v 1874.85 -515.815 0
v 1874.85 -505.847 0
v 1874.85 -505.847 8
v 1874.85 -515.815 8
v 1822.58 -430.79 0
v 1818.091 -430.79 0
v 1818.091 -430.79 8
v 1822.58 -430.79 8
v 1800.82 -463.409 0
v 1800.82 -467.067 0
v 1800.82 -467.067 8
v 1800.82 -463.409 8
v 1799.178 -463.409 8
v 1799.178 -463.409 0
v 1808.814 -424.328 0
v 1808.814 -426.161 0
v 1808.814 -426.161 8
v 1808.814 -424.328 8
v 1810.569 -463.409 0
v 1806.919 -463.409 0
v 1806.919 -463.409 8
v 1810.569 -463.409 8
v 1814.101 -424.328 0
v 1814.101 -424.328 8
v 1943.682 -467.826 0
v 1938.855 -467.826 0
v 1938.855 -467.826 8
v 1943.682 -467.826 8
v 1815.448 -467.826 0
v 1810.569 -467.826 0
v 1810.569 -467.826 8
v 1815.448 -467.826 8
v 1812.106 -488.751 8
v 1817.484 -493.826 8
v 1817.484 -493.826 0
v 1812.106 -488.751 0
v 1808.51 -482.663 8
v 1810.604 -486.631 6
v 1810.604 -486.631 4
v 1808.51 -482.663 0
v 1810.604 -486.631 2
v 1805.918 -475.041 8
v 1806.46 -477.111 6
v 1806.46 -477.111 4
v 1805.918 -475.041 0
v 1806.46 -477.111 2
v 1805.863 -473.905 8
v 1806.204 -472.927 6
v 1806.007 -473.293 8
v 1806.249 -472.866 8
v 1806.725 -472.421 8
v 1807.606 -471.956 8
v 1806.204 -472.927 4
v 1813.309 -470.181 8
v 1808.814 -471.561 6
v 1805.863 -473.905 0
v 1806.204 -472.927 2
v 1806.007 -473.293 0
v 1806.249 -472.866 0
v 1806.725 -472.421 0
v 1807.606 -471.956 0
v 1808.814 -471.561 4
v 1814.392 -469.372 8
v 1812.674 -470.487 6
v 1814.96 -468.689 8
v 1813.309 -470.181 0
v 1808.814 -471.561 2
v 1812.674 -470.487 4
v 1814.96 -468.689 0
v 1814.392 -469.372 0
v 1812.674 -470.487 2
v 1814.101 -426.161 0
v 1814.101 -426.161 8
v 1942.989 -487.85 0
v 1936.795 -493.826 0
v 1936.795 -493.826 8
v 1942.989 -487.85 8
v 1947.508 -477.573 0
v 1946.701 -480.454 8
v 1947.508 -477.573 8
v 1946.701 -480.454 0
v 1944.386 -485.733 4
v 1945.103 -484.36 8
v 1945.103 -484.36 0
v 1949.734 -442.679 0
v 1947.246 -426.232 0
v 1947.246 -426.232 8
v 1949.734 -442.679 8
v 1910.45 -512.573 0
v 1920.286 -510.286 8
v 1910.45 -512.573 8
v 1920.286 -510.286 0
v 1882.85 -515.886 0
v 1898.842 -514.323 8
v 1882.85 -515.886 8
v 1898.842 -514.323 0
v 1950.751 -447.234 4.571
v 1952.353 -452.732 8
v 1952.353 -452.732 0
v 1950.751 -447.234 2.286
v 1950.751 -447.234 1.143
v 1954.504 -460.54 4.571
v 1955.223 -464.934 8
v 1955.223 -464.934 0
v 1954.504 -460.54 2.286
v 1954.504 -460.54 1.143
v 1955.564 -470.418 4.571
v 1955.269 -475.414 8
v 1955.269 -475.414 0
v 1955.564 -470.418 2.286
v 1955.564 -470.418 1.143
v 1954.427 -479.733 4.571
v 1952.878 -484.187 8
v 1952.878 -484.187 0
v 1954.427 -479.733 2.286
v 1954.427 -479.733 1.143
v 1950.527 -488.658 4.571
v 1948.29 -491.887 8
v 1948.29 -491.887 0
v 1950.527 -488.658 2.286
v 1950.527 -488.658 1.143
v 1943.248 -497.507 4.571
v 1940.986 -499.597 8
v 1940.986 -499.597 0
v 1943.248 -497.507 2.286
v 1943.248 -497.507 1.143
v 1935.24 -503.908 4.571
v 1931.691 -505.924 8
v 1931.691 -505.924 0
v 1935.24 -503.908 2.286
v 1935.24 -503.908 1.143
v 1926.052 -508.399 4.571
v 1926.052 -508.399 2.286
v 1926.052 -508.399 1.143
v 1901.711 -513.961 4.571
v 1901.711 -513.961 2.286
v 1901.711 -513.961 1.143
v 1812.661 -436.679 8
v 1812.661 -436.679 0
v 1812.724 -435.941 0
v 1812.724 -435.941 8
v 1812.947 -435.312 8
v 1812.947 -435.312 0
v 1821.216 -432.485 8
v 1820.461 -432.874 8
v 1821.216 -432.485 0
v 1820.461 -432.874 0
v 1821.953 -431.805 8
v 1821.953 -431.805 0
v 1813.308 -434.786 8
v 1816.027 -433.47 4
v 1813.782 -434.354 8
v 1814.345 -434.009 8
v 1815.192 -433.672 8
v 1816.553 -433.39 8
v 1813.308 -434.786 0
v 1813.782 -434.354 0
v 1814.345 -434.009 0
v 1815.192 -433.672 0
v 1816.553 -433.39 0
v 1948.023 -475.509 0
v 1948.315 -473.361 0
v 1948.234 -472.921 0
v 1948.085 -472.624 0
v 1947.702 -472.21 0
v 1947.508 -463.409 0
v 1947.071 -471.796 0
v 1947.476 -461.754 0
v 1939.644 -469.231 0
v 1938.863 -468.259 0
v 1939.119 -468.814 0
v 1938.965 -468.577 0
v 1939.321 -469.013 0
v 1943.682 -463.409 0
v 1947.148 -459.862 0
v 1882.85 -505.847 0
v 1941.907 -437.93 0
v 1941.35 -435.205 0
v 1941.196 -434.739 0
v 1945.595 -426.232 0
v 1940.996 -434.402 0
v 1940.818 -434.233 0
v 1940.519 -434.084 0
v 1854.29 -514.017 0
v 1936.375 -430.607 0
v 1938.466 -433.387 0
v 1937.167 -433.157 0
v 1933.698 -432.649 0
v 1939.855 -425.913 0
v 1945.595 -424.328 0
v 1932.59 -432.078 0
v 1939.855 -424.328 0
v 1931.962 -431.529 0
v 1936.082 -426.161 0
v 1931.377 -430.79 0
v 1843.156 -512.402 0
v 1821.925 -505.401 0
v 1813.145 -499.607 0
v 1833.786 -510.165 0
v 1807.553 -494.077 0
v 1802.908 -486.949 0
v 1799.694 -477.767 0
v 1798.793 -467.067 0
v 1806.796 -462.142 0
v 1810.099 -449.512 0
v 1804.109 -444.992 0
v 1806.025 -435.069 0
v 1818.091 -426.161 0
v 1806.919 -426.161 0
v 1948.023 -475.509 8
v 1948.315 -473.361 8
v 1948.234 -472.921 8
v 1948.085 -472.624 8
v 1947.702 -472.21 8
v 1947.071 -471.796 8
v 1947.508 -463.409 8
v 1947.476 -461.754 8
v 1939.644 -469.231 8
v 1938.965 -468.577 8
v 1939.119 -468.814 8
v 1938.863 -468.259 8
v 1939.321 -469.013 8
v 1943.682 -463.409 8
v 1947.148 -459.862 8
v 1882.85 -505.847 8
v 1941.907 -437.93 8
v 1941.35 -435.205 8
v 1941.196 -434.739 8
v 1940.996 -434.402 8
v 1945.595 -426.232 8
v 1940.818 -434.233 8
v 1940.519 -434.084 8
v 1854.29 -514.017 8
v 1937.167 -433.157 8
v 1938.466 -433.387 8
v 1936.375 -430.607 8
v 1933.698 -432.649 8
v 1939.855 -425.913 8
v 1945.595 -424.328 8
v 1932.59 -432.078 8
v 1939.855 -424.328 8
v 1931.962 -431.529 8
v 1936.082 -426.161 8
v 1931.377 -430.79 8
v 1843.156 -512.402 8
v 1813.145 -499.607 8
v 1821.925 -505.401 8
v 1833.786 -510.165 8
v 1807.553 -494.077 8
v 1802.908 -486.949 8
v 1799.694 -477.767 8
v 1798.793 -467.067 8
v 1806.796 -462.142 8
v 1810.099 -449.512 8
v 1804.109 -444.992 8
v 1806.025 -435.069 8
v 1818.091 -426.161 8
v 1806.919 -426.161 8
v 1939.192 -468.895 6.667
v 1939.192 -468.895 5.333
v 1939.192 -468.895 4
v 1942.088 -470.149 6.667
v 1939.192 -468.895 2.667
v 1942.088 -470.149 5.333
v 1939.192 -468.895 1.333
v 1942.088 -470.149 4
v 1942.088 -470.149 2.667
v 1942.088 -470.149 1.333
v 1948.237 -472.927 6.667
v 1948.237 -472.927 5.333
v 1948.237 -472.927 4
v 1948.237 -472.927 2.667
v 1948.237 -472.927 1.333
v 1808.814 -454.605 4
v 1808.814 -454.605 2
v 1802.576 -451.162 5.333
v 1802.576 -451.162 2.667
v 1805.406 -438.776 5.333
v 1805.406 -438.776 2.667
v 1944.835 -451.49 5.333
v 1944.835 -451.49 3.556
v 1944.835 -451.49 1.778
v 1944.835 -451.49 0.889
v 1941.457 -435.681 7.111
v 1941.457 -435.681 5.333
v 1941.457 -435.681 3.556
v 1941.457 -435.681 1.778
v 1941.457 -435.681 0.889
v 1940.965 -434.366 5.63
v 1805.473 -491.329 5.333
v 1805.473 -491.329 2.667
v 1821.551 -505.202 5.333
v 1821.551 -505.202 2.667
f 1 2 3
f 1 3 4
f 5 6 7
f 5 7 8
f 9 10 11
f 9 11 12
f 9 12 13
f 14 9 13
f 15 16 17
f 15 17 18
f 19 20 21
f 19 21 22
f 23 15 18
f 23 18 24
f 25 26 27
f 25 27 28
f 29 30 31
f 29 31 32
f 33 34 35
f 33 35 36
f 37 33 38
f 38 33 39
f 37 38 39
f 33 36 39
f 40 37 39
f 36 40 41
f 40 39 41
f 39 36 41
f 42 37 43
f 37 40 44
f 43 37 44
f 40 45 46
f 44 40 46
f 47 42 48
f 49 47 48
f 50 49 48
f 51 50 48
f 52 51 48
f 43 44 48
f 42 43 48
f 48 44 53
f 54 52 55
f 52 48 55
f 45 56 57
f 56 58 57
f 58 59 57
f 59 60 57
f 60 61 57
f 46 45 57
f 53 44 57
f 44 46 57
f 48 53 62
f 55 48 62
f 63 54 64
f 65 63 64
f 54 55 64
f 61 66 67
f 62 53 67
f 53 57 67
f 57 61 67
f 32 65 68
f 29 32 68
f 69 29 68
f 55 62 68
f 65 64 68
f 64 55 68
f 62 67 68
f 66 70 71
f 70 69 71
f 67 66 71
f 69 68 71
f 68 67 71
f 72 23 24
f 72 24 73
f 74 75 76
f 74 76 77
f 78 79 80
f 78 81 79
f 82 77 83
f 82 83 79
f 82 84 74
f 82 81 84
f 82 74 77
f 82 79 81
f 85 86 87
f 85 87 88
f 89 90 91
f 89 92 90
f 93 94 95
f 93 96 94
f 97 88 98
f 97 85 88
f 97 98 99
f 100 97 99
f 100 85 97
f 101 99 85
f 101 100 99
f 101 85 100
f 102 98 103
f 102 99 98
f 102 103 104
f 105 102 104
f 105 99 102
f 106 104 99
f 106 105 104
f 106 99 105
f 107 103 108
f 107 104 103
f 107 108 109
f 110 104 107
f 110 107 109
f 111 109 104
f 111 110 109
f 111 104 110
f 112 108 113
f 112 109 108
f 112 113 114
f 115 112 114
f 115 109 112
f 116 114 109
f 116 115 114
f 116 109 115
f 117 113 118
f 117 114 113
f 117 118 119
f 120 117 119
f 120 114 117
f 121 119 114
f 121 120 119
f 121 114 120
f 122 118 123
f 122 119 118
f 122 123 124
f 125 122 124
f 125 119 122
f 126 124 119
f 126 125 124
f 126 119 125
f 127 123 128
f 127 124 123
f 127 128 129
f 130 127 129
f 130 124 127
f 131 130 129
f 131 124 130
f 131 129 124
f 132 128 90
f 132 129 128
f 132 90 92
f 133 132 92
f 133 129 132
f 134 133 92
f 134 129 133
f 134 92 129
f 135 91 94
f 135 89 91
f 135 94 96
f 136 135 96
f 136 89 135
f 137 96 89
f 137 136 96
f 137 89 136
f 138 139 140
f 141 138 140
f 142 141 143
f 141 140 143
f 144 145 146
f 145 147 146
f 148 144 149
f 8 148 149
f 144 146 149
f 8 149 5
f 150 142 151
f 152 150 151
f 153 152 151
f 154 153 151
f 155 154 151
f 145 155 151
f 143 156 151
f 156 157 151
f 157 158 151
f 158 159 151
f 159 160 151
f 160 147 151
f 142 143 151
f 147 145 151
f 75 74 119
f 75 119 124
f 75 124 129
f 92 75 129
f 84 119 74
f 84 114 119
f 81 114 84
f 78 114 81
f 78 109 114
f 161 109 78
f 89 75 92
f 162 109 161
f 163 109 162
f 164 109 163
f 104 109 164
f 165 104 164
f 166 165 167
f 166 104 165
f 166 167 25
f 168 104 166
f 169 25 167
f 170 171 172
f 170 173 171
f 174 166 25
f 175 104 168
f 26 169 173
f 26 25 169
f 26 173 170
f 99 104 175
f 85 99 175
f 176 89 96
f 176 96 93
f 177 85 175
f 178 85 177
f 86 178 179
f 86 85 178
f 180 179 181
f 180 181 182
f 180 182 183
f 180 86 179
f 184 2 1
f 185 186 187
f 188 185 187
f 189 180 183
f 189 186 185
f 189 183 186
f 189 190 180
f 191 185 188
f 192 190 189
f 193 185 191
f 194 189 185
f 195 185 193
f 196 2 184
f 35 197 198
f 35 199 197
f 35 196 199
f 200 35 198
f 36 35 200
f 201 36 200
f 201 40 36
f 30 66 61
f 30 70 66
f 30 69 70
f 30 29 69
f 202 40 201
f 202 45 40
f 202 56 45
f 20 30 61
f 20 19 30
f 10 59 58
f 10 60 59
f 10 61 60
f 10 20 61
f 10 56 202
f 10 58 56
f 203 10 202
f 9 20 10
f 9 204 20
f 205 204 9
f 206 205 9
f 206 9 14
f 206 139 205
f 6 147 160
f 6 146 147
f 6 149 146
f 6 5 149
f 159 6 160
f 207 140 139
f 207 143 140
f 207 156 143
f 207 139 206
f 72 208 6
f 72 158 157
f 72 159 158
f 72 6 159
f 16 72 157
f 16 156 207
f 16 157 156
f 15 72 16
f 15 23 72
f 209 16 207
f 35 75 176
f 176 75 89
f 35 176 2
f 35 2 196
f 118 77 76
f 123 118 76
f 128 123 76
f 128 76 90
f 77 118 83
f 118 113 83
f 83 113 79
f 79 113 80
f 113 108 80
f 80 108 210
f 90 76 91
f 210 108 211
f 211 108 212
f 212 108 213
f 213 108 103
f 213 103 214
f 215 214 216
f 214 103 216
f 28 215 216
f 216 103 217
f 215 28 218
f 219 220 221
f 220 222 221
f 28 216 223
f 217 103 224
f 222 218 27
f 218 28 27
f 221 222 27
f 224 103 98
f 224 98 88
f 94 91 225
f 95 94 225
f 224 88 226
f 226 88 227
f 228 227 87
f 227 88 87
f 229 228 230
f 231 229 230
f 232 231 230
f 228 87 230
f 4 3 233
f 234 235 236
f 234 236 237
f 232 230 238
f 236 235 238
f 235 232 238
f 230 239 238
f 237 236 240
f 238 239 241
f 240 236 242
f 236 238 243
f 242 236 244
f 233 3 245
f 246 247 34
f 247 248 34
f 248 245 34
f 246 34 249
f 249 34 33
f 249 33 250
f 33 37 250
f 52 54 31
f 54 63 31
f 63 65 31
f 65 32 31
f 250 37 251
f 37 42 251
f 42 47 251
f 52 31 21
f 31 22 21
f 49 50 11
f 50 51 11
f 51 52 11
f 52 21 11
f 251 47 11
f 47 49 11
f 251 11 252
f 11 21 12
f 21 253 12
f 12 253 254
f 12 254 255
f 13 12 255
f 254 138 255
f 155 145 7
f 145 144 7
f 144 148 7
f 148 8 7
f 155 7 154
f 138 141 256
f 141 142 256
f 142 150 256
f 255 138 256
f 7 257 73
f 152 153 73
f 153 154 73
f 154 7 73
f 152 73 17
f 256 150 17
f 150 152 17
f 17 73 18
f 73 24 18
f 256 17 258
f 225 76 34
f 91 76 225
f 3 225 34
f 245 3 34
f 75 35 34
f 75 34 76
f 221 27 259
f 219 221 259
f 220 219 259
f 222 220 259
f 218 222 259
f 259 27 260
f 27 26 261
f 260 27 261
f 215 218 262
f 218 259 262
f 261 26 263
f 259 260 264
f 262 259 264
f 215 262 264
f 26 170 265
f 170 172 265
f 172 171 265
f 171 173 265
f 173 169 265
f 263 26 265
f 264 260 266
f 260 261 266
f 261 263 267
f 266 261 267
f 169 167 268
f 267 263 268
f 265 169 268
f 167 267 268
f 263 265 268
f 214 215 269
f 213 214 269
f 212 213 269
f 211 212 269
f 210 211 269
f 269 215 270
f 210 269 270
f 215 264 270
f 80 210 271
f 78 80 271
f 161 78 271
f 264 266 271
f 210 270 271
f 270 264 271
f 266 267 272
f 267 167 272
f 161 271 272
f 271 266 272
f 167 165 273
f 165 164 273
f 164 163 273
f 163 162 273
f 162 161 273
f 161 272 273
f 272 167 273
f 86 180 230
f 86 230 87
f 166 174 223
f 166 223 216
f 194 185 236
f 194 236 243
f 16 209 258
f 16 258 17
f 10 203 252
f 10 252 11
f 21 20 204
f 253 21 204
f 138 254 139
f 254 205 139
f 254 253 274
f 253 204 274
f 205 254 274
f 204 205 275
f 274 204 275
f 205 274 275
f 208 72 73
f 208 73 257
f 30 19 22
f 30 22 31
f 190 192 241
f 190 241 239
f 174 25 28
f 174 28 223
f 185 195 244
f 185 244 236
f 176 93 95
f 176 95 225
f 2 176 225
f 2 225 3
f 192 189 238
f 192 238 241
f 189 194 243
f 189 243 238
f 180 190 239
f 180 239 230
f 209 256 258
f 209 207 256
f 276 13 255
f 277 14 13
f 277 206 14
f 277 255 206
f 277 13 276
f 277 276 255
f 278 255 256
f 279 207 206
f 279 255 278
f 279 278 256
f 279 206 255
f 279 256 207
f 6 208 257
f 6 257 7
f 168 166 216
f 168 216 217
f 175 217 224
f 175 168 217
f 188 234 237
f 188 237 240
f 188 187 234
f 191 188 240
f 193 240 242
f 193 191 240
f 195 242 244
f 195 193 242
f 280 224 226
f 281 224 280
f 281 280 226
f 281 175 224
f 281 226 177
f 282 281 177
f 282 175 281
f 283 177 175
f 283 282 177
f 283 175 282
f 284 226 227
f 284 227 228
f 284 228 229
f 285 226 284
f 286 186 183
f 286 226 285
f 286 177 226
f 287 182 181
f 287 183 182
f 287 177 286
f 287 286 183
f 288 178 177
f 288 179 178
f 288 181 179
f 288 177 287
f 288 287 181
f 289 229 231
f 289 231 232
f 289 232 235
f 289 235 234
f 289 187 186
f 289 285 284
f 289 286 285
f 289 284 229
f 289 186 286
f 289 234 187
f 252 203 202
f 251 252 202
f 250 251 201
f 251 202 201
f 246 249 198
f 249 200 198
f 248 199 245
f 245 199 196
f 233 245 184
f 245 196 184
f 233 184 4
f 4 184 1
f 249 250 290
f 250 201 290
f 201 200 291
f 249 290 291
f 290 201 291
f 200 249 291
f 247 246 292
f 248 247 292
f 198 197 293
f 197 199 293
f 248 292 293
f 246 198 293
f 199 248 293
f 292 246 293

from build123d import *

# Parameters (mm, degrees)
EXTRUDE_1_DEPTH = 8


with BuildPart() as part:
    # 草图1 → 凸台-拉伸1 (new body)
    with BuildSketch(Plane.XY):
        with BuildLine():
            Line((1817.483715836, -493.825942956), (1936.795496106, -493.825942956))
            add(Edge.make_bspline(
                [(1936.795496106, -493.825942956), (1939.747205065, -491.176513643), (1944.2875945, -488.011108288), (1947.275764377, -479.018631105), (1947.507857706, -477.572527646)],
                knots=[0, 0, 0, 0, 0.565522661, 1, 1, 1, 1], degree=3))
            add(Edge.make_bspline(
                [(1938.85465802, -467.826292211), (1938.747248524, -468.790640628), (1940.08271868, -469.517965224), (1942.928801099, -470.453243252), (1945.705758528, -470.970230575), (1948.479929892, -472.559992486), (1948.144981641, -475.039552925), (1947.844617595, -476.44560544), (1947.507857706, -477.572527646)],
                knots=[0, 0, 0, 0, 0.139251813, 0.269940583, 0.567641647, 0.702119282, 0.788209765, 1, 1, 1, 1], degree=3))
            Line((1938.85465802, -467.826292211), (1943.682232582, -467.826292211))
            Line((1943.682232582, -467.826292211), (1943.682232582, -463.408606056))
            Line((1943.682232582, -463.408606056), (1947.507857706, -463.408606056))
            add(Edge.make_bspline(
                [(1947.507857706, -463.408606056), (1947.644081893, -461.495199541), (1946.520167415, -457.500364323), (1944.513422546, -450.590855735), (1942.814624339, -442.986643708), (1941.871430704, -437.596676652), (1941.126830231, -434.120937124), (1939.790888184, -433.95108547), (1938.780764124, -433.422181689), (1935.744837567, -432.821786941), (1933.008453776, -433.246758107), (1931.377193483, -430.790327181)],
                knots=[0, 0, 0, 0, 0.141971978, 0.305068463, 0.542473394, 0.707535874, 0.747502764, 0.772218948, 0.798960348, 0.833580938, 1, 1, 1, 1], degree=3))
            Line((1931.377193483, -430.790327181), (1936.37470245, -430.607172402))
            Line((1936.37470245, -430.607172402), (1936.081711435, -426.161193192))
            Line((1936.081711435, -426.161193192), (1939.854643249, -425.912556149))
            Line((1939.854643249, -425.912556149), (1939.854643249, -424.327579983))
            Line((1939.854643249, -424.327579983), (1945.595045144, -424.327579983))
            Line((1945.595045144, -424.327579983), (1945.595045144, -426.231632553))
            Line((1945.595045144, -426.231632553), (1947.245608576, -426.231632553))
            add(Edge.make_bspline(
                [(1947.245608576, -426.231632553), (1948.366615252, -433.204359796), (1949.374814619, -445.031727754), (1954.382912802, -458.218973948), (1956.779624263, -476.354127582), (1952.899985045, -489.099013973), (1936.4796815, -503.623940281), (1916.927875936, -513.806623528), (1890.695595323, -515.044667383), (1882.84950633, -515.88582089)],
                knots=[0, 0, 0, 0, 0.167478871, 0.276196699, 0.331934485, 0.591851171, 0.630173858, 0.715161347, 1, 1, 1, 1], degree=3))
            Line((1882.84950633, -515.88582089), (1882.84950633, -505.847461251))
            Line((1882.84950633, -505.847461251), (1874.850484606, -505.847461251))
            Line((1874.850484606, -505.847461251), (1874.850484606, -515.815381529))
            add(Edge.make_bspline(
                [(1798.793058799, -467.067195529), (1798.373910849, -475.483548392), (1802.571951061, -491.652561332), (1830.113890776, -513.737805099), (1857.262557517, -514.219471382), (1874.850484606, -515.815381529)],
                knots=[0, 0, 0, 0, 0.251171204, 0.460841663, 1, 1, 1, 1], degree=3))
            Line((1798.793058799, -467.067195529), (1800.819597975, -467.067195529))
            Line((1800.819597975, -467.067195529), (1800.819597975, -463.408606056))
            Line((1800.819597975, -463.408606056), (1799.177963162, -463.408606056))
            add(Edge.make_bspline(
                [(1799.177963162, -463.408606056), (1802.610090374, -451.202753829), (1806.315603165, -438.91991757), (1806.918680909, -426.161193192)],
                knots=[0, 0, 0, 0, 1, 1, 1, 1], degree=3))
            Line((1806.918680909, -426.161193192), (1808.814029121, -426.161193192))
            Line((1808.814029121, -426.161193192), (1808.814029121, -424.327579983))
            Line((1808.814029121, -424.327579983), (1814.101053078, -424.327579983))
            Line((1814.101053078, -424.327579983), (1814.101053078, -426.161193192))
            Line((1814.101053078, -426.161193192), (1818.091259838, -426.161193192))
            Line((1818.091259838, -426.161193192), (1818.091259838, -430.790327181))
            Line((1818.091259838, -430.790327181), (1822.580242443, -430.790327181))
            add(Edge.make_bspline(
                [(1812.661367598, -436.679246025), (1812.594104804, -434.671911838), (1816.816514674, -432.473909369), (1821.174335654, -433.791417411), (1822.580242443, -430.790327181)],
                knots=[0, 0, 0, 0, 0.40393493, 1, 1, 1, 1], degree=3))
            add(Edge.make_bspline(
                [(1806.918680909, -463.408606056), (1806.43605636, -461.391437349), (1808.030340289, -458.653747617), (1808.846583553, -454.190275227), (1810.793601017, -447.243989986), (1811.868086649, -441.214704861), (1812.661367598, -436.679246025)],
                knots=[0, 0, 0, 0, 0.211182266, 0.331084874, 0.496001788, 1, 1, 1, 1], degree=3))
            Line((1806.918680909, -463.408606056), (1810.568796148, -463.408606056))
            Line((1810.568796148, -463.408606056), (1810.568796148, -467.826292211))
            Line((1810.568796148, -467.826292211), (1815.447606527, -467.826292211))
            add(Edge.make_bspline(
                [(1817.483715836, -493.825942956), (1811.475963031, -489.464312999), (1808.27204524, -483.56463233), (1805.166709499, -472.766269003), (1810.654910833, -470.830344712), (1814.113936464, -470.706525868), (1815.447606527, -467.826292211)],
                knots=[0, 0, 0, 0, 0.575037688, 0.693620289, 0.776964582, 1, 1, 1, 1], degree=3))
        make_face()
    extrude(amount=EXTRUDE_1_DEPTH)


solid = part.part
